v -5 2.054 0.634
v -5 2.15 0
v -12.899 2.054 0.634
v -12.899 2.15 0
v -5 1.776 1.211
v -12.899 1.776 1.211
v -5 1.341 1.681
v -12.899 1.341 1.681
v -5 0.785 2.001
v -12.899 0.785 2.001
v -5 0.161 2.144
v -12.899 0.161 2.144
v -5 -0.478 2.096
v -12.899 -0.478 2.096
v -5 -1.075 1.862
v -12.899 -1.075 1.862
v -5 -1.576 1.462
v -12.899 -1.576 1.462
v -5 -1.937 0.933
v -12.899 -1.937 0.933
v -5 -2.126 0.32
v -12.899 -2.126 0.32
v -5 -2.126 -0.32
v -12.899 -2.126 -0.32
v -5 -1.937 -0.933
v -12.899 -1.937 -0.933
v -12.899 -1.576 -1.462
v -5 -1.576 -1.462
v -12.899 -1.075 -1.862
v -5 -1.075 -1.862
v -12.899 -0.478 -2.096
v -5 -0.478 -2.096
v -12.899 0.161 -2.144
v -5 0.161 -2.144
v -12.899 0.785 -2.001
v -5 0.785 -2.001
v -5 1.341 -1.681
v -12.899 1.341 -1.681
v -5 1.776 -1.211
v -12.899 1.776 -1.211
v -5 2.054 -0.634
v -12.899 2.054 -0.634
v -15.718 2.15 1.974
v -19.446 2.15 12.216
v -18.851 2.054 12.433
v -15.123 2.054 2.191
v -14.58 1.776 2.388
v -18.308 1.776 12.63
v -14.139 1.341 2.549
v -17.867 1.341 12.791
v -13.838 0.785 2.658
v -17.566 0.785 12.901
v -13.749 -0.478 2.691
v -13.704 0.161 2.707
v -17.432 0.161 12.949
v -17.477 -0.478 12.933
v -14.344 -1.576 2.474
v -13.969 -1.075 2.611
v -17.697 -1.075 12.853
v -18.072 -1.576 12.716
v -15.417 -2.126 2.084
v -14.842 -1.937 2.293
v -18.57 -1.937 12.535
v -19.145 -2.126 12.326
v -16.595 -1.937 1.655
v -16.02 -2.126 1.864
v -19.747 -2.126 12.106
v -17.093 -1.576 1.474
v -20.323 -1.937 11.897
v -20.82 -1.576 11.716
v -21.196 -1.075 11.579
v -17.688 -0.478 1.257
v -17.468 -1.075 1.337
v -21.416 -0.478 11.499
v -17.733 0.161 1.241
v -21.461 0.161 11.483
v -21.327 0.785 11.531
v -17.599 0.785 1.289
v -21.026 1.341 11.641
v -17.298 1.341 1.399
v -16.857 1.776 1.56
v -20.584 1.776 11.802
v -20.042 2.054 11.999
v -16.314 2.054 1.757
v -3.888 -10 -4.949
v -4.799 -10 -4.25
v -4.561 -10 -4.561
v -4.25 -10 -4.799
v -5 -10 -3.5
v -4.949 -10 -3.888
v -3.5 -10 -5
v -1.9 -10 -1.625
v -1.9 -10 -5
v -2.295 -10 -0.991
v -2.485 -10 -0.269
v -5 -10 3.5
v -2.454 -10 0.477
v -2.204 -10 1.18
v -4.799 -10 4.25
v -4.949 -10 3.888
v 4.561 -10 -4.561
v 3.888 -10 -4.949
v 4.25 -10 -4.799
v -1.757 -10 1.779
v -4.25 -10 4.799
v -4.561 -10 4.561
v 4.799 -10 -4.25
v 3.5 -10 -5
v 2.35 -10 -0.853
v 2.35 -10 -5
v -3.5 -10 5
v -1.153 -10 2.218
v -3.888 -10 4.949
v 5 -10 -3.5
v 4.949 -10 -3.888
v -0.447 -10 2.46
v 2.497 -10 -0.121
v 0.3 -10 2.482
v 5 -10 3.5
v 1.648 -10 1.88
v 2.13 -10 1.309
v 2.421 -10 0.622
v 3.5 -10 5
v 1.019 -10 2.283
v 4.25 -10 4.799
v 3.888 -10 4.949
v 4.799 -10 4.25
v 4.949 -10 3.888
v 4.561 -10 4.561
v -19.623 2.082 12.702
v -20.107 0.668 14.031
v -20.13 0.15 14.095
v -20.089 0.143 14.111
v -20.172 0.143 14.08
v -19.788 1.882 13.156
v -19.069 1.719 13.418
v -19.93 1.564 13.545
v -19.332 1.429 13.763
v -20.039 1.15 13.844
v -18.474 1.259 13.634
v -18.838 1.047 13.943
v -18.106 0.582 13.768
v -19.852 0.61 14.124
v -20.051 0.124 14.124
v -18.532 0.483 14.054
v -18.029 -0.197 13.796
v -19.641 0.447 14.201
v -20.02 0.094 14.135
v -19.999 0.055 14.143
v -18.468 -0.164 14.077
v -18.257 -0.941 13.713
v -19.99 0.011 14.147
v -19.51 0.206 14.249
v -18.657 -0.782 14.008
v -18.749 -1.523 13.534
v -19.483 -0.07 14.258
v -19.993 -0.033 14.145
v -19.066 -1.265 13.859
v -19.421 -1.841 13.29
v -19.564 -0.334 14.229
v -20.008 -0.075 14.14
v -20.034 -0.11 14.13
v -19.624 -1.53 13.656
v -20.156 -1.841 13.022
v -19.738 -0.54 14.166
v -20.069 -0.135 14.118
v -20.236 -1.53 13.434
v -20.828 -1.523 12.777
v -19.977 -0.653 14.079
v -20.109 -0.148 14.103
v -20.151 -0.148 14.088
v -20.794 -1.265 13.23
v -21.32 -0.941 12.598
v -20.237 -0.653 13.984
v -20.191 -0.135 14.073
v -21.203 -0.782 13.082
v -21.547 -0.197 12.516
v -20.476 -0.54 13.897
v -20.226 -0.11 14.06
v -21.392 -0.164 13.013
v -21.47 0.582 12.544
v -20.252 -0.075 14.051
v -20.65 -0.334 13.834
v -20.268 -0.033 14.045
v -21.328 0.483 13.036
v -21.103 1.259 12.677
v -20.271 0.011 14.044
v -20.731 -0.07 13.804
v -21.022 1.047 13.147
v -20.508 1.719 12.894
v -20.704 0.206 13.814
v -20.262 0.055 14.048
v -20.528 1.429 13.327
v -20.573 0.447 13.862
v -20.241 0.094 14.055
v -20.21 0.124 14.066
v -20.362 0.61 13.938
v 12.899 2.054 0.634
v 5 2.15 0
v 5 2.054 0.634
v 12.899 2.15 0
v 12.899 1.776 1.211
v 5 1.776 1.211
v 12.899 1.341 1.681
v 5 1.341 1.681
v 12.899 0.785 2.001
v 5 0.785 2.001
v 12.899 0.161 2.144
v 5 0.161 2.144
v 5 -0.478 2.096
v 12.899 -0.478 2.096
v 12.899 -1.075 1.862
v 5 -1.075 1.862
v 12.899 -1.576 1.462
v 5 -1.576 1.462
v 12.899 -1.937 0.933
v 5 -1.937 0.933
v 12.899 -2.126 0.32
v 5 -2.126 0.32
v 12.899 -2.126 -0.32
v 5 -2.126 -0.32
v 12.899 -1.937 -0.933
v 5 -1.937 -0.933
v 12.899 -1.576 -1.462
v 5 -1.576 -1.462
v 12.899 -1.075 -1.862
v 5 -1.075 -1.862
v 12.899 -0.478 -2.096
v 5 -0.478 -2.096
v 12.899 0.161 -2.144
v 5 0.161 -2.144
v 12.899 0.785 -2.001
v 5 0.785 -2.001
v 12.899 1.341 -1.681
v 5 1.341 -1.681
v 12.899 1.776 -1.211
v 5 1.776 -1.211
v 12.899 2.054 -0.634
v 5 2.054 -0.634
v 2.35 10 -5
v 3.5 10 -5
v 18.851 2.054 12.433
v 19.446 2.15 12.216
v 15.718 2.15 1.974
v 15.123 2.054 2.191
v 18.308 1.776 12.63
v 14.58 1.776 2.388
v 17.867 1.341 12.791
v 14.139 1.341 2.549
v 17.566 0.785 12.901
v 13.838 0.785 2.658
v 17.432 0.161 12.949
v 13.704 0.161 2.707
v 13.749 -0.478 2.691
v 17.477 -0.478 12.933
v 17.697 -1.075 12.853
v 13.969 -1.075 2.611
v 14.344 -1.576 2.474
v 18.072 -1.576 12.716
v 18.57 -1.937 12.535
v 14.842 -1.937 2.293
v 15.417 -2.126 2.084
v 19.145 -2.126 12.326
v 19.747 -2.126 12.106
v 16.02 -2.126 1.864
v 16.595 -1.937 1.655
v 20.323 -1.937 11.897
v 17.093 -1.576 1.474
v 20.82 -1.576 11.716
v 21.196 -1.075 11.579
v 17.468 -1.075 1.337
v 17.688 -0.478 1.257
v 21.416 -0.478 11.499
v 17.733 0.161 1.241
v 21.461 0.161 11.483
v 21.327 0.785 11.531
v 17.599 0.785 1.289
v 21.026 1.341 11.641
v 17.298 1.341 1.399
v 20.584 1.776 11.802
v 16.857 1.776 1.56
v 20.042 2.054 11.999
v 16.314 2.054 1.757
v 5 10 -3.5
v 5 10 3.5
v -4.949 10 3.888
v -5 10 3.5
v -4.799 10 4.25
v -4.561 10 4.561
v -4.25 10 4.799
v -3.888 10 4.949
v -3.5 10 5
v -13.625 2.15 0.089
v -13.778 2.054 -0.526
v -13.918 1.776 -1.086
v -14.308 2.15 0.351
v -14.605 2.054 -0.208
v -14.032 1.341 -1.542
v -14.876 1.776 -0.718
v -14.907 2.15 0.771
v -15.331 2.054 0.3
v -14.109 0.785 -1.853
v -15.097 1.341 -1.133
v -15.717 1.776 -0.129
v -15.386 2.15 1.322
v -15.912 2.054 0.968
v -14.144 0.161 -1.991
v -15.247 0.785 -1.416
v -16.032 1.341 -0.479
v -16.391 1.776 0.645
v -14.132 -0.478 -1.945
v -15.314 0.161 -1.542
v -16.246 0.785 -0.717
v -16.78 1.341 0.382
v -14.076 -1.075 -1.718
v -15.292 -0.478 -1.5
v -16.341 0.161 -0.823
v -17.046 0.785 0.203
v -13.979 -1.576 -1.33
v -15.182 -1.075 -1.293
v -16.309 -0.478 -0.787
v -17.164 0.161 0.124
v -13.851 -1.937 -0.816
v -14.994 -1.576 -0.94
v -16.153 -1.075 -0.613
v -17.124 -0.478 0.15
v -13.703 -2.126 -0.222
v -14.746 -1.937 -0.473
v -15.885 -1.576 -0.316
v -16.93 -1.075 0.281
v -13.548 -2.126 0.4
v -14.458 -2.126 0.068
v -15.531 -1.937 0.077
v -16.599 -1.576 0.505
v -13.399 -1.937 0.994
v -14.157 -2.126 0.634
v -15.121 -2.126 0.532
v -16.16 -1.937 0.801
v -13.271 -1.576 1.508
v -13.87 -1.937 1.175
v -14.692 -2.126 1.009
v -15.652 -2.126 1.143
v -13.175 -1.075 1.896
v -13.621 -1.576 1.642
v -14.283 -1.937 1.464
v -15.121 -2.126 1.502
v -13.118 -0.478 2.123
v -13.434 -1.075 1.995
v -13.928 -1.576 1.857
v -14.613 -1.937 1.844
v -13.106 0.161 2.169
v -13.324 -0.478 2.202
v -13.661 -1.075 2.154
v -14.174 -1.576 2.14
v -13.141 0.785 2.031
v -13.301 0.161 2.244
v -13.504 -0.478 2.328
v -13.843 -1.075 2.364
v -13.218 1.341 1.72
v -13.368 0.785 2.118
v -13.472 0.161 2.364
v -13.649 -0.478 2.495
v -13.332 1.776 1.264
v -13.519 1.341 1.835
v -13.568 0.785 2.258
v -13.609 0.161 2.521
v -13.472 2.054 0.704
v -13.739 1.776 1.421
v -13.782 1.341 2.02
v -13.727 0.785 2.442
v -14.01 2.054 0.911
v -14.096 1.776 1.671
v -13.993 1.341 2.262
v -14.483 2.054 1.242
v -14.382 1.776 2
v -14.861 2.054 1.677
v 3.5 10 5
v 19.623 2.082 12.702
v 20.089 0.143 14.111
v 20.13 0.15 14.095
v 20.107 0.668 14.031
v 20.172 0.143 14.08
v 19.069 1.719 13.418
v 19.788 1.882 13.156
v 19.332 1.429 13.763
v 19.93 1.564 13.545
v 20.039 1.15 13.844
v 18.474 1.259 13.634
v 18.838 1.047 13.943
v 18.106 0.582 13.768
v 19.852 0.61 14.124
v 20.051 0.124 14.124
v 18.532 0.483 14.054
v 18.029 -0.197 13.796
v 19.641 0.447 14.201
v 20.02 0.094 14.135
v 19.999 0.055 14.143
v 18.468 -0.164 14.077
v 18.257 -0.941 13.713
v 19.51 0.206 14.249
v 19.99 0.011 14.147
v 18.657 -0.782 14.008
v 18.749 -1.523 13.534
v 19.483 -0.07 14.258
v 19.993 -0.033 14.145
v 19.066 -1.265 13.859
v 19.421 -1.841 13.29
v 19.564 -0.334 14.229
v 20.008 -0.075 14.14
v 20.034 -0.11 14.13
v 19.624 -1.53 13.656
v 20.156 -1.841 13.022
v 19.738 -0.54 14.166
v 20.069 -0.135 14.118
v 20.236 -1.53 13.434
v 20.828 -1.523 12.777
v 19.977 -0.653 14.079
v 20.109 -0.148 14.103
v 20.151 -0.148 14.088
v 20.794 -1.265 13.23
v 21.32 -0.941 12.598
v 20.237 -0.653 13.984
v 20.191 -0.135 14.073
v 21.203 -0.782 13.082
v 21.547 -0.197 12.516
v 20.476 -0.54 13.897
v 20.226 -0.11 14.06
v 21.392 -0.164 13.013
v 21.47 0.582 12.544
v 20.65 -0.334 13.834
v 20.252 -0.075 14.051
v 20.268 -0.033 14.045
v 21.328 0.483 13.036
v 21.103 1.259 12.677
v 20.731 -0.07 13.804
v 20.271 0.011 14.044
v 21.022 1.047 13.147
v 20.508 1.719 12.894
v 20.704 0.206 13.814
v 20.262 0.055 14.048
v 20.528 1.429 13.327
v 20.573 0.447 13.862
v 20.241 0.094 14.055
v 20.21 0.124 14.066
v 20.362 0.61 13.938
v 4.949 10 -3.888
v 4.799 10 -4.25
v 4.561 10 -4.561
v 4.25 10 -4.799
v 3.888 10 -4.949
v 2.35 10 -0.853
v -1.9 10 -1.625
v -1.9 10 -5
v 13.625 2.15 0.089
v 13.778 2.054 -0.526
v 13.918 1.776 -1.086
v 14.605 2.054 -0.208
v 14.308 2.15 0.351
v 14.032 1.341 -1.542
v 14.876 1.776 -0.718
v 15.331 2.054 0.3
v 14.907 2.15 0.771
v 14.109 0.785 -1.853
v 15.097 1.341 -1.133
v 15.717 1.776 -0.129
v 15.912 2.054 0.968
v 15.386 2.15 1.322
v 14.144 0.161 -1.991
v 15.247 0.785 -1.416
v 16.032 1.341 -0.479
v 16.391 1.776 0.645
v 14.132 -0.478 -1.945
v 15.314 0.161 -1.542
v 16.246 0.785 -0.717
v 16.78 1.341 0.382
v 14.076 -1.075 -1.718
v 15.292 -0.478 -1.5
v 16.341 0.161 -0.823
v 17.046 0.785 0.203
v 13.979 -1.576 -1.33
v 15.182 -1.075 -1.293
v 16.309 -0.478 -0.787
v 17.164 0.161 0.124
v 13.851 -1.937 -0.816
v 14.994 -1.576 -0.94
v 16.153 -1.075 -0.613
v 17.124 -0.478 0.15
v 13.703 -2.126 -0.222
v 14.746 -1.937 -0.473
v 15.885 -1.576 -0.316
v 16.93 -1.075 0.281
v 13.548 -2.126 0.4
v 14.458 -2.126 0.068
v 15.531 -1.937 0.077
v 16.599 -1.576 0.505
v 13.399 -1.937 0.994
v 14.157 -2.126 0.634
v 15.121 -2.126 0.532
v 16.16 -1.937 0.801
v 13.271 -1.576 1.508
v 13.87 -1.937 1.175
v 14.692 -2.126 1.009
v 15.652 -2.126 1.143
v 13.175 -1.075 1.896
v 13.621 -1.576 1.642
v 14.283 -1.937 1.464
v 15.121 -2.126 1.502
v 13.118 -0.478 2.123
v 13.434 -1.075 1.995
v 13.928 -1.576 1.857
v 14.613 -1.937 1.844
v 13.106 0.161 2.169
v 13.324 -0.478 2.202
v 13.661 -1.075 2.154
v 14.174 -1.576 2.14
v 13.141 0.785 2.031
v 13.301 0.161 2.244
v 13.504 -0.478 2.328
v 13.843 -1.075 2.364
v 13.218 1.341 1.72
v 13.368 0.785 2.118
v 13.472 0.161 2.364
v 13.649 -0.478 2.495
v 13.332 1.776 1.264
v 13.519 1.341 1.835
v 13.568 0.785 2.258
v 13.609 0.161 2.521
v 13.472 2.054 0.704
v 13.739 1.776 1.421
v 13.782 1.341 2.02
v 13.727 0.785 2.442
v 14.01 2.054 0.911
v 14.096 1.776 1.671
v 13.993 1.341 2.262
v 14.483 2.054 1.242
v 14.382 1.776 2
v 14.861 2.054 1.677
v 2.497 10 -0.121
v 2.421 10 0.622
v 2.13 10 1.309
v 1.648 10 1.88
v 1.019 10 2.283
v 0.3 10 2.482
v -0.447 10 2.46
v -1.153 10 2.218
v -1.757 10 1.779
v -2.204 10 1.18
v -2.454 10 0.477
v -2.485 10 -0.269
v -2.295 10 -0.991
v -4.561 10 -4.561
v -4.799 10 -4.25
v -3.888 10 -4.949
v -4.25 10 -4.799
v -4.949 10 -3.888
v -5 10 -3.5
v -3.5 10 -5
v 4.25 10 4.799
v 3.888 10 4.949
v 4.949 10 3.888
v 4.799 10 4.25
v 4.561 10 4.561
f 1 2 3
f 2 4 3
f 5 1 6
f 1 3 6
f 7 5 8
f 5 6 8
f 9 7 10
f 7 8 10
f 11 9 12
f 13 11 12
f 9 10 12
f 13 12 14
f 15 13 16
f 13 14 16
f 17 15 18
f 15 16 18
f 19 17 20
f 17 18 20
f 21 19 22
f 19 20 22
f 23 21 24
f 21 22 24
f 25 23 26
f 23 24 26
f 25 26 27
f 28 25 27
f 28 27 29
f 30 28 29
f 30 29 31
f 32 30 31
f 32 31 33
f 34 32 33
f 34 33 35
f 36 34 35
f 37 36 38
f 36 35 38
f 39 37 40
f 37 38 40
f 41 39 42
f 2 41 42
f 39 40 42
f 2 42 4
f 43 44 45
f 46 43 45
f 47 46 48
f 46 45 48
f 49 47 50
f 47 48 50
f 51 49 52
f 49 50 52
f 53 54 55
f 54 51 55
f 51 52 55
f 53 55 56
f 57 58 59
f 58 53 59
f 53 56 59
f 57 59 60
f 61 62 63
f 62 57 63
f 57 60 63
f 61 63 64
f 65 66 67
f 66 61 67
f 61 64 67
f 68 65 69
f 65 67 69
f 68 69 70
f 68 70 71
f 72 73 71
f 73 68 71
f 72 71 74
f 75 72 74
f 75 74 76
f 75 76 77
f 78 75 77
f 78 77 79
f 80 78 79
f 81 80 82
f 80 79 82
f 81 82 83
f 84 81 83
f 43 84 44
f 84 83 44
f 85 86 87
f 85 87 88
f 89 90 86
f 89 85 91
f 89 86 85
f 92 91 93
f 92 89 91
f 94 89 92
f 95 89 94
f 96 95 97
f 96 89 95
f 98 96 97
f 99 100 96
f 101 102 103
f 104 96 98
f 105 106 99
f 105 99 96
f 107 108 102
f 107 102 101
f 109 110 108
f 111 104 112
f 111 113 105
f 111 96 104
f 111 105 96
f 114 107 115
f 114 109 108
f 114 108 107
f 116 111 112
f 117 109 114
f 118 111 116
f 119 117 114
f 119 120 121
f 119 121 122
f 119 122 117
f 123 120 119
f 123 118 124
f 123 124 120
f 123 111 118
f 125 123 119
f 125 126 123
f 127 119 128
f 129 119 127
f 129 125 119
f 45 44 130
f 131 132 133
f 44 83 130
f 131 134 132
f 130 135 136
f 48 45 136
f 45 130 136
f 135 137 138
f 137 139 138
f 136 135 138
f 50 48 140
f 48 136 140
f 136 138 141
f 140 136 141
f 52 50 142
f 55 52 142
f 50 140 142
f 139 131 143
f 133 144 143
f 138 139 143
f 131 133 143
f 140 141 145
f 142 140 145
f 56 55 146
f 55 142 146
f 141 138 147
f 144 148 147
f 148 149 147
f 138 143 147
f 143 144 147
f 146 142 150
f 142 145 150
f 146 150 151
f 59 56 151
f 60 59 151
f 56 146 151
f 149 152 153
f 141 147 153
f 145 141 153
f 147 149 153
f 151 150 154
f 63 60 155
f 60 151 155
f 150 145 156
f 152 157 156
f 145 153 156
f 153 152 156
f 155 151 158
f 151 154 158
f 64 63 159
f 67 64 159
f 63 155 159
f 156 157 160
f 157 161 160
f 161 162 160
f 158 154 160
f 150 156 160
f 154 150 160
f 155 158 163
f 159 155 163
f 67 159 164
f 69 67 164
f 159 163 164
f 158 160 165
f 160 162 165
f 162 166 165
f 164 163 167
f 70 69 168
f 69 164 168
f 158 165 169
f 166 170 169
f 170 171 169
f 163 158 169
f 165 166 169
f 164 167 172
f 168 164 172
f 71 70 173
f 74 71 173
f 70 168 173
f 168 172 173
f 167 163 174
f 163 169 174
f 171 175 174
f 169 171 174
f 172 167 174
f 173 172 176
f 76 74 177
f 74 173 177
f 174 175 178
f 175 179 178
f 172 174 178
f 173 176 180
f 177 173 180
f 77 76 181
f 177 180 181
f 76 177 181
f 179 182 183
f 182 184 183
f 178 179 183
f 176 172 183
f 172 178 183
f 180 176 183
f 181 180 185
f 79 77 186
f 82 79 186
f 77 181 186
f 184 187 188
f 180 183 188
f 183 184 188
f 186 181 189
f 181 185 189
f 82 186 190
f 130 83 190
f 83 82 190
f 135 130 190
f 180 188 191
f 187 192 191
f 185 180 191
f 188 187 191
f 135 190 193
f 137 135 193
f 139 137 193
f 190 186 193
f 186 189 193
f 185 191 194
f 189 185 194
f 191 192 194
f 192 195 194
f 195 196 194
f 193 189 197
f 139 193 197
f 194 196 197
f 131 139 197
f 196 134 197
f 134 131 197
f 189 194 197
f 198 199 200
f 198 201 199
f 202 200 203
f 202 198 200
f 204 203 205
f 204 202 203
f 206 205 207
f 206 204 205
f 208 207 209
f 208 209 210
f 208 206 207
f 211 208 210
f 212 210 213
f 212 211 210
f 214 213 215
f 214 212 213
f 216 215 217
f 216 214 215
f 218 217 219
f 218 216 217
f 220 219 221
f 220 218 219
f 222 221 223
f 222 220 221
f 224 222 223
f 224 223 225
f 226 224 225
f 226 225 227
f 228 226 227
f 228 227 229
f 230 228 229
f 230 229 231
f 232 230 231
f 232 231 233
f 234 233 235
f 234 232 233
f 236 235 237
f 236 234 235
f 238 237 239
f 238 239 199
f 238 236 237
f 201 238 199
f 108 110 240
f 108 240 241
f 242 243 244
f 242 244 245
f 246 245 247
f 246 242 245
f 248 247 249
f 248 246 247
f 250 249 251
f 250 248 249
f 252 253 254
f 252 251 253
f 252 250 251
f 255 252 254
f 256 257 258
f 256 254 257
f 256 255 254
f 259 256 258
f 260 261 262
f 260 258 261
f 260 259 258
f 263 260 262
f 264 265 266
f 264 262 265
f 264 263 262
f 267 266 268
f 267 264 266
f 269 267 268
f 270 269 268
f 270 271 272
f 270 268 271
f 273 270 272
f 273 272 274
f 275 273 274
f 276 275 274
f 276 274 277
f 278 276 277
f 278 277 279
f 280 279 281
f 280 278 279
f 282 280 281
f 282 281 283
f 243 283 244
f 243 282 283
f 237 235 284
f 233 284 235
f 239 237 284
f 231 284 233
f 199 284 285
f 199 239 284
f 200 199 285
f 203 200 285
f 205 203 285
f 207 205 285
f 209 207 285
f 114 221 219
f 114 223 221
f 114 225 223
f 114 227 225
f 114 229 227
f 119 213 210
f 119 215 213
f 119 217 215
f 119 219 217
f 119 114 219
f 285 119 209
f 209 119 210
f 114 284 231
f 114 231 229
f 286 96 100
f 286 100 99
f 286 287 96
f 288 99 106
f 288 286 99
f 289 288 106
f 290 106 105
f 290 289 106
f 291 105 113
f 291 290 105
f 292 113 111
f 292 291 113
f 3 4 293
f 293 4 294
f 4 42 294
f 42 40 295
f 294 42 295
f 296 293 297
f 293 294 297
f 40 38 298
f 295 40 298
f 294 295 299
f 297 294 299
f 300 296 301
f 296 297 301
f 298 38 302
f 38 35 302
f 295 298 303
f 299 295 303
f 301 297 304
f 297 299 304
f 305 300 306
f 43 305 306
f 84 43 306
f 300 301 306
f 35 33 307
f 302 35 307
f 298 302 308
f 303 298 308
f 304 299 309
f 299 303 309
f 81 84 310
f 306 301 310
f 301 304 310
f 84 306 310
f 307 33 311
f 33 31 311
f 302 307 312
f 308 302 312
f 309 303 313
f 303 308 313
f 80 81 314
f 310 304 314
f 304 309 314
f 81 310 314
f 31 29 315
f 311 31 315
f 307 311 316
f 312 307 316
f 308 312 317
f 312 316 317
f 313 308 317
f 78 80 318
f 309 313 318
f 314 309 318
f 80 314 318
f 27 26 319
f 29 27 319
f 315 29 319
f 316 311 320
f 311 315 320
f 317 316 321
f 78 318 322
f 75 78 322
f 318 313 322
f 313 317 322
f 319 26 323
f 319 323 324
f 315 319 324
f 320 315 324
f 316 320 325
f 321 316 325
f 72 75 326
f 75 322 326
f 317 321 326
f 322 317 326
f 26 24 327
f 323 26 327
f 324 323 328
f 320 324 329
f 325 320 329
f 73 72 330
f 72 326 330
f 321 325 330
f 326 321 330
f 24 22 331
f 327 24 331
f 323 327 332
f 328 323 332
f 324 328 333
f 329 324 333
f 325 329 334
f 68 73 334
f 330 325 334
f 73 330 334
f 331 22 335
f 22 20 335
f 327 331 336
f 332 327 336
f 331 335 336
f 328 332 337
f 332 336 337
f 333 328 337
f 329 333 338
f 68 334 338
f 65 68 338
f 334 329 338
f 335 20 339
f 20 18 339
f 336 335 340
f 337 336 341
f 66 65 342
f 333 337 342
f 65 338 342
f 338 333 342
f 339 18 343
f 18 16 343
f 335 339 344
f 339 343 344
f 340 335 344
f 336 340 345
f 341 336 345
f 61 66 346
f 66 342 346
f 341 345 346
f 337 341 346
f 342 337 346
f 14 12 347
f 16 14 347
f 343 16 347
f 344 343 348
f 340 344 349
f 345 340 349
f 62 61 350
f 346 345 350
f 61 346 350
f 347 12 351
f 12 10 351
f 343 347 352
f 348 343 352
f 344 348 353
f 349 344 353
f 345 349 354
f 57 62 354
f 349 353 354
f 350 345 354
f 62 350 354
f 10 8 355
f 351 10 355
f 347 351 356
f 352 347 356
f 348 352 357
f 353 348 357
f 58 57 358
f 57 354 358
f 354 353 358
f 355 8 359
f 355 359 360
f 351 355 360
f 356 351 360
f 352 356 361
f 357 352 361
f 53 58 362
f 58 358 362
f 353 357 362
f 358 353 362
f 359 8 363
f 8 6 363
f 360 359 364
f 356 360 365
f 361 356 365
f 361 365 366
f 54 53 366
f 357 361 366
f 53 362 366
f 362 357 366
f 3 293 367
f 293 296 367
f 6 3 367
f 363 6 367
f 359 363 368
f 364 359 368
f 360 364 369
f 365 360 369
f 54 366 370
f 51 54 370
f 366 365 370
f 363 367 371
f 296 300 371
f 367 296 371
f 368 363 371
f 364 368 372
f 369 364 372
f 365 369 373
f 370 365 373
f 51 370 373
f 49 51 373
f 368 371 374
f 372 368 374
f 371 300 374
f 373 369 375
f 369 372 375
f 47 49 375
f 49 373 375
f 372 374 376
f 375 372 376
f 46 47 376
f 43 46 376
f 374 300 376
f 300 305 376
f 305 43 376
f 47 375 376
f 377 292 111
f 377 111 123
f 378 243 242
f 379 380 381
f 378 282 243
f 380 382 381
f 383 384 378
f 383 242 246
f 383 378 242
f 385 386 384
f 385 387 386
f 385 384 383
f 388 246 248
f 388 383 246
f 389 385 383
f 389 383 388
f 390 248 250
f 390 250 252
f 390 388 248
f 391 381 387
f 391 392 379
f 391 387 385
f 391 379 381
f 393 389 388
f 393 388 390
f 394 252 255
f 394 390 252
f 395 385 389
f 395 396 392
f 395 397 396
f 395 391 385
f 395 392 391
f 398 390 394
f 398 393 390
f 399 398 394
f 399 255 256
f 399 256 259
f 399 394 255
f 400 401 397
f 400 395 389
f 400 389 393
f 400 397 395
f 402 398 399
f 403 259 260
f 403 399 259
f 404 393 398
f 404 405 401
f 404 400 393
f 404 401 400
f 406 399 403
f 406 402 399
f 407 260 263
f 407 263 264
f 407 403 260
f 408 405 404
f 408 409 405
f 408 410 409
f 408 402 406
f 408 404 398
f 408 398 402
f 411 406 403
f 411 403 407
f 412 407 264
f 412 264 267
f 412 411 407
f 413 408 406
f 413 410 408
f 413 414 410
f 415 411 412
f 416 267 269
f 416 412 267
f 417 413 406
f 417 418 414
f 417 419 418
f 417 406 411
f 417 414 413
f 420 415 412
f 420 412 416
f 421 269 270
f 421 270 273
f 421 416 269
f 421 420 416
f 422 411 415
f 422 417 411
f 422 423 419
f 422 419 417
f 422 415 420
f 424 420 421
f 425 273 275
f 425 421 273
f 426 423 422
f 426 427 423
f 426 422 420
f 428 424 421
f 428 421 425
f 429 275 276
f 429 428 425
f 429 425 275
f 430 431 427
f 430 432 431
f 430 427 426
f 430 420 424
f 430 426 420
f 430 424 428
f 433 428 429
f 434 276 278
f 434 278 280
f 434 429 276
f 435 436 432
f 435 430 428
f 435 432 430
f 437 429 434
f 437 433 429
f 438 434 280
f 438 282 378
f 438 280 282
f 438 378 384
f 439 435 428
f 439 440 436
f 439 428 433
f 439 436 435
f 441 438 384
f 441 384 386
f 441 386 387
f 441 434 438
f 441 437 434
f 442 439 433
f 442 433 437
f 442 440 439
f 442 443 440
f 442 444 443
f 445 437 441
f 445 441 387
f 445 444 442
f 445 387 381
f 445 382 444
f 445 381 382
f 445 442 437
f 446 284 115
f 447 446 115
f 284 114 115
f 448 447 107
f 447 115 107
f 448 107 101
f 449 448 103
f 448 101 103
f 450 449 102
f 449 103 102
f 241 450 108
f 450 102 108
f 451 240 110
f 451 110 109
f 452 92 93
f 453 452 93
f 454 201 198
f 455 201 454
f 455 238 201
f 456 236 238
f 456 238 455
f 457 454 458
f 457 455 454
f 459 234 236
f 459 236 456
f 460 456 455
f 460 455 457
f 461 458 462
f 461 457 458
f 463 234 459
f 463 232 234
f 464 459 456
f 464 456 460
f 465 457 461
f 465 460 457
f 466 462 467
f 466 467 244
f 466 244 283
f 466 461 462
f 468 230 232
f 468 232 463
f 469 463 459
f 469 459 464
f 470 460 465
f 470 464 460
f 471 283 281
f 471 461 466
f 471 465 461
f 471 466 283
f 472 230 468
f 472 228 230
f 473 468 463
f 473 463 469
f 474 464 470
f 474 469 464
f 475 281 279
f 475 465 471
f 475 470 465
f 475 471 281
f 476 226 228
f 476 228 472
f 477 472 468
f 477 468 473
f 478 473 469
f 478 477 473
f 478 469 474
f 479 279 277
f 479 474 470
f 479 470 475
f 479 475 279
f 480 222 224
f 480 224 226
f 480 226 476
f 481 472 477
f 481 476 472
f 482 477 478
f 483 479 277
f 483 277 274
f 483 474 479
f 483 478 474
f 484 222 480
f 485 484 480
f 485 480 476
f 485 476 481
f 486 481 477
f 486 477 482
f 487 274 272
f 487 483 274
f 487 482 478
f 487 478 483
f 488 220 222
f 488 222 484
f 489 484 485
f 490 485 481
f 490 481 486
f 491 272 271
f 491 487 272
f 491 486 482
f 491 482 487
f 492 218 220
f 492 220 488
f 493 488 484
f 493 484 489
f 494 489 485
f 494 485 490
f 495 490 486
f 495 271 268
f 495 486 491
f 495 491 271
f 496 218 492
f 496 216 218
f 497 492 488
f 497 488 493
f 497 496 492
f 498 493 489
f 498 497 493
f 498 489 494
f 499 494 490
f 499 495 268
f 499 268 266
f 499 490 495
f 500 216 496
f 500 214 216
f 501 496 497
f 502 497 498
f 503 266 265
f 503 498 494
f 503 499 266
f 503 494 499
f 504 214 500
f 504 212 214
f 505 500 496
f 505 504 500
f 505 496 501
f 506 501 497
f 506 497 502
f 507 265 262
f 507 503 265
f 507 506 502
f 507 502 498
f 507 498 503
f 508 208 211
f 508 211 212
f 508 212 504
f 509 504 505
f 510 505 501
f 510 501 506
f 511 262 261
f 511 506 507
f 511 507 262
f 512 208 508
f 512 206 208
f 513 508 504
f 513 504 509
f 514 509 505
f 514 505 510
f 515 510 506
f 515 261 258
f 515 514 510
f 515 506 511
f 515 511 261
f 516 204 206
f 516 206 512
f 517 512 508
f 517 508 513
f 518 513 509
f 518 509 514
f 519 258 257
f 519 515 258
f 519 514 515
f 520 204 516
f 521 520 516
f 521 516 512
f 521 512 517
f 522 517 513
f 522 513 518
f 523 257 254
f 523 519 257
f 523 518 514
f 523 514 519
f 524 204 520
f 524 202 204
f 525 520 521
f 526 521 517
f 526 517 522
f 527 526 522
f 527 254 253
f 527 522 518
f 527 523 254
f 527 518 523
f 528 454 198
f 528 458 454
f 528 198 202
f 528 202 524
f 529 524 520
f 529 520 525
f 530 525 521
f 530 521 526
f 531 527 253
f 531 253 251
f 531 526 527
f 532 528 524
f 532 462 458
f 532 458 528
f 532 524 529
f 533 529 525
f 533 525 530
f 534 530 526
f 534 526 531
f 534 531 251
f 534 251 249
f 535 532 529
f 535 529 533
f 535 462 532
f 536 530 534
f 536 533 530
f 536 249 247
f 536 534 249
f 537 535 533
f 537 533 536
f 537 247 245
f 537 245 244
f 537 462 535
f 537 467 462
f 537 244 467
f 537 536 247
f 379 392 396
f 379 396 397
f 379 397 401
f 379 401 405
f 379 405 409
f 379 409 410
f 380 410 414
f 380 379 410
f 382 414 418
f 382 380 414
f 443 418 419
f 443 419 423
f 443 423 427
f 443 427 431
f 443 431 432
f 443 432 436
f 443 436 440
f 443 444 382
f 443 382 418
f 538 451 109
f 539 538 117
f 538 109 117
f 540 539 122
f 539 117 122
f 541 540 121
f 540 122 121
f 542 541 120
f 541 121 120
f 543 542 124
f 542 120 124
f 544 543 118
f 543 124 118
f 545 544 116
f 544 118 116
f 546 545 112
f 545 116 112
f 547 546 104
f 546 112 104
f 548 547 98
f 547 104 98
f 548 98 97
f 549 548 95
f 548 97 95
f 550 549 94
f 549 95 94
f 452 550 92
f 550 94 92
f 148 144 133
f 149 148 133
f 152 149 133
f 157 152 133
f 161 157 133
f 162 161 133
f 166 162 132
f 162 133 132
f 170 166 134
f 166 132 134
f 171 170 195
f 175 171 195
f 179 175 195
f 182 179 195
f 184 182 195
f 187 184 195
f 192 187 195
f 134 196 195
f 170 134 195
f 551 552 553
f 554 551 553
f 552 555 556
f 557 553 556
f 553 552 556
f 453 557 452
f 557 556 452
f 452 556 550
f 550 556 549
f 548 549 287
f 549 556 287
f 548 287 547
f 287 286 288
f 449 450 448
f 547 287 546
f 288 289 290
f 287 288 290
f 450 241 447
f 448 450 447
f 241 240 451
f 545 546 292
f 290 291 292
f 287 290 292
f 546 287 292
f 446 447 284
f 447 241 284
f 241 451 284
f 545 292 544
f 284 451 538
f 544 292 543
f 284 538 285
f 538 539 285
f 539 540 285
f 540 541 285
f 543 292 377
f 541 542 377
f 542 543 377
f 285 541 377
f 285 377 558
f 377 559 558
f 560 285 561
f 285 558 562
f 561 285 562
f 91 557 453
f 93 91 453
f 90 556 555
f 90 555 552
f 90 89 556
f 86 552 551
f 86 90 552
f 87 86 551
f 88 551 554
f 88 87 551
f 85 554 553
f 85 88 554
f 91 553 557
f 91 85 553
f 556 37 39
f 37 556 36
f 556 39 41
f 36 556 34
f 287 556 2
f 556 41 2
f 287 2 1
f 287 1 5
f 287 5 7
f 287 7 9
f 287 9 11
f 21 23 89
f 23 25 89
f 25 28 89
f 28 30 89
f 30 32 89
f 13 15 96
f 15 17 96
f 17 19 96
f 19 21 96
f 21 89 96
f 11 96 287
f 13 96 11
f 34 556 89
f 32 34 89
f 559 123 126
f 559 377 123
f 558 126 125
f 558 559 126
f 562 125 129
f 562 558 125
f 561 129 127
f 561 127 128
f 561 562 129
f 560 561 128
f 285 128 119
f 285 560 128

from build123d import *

# Parameters (mm, degrees)
F0_W     = 10
F0_H     = 10
F1_DEPTH = 10
F4_R     = 2.15
F3_R     = 2.5
F7_DEPTH = 25
F8_W     = 4.25
F8_H     = 1.8911467679
F9_DEPTH = 63
F10_R    = 1.5
F11_R    = 2


# Not quite as in the source:
# - an extrude ends at something that could not be found from the text; its depth is read off the source's solid


with BuildPart() as f1:
    # F0 (on Front) → F1 (new body, symmetric)
    with BuildSketch(Plane.XZ):
        Rectangle(F0_W, F0_H)
    extrude(amount=F1_DEPTH, both=True)

    # F5: sweep along a path in F2
    with BuildLine(Plane.XZ) as f5_path:
        Line((0, 0), (12.8993773854, 0))
        ThreePointArc((12.8993773854, 0), (14.6201066944, 0.5425438671), (15.7184552477, 1.97393957))
        Line((15.7184552477, 1.97393957), (20.1303021499, 14.0953893118))
    # F4 (on face) → F5 (sweep)
    with BuildSketch(Plane.YZ.offset(5)):
        Circle(F4_R)
    sweep(path=f5_path.line)

    # F6: F1 across plane


with BuildPart() as f1_1:
    add(f1.part)
    add(f1.part.mirror(Plane.YZ))

    # F3 (on face) → F7 (cut)
    with BuildSketch(Plane.XZ.offset(10)):
        Circle(F3_R)
    extrude(amount=-F7_DEPTH, mode=Mode.SUBTRACT)

    # F8 (on face) → F9 (cut, through all)
    with BuildSketch(Plane.XZ.offset(10)):
        with Locations((0.225, -5.9455733839)):
            Rectangle(F8_W, F8_H)
        with BuildLine():
            Line((-1.9, -1.6248076809), (-1.9, -5))
            Line((-1.9, -5), (2.35, -5))
            Line((2.35, -5), (2.35, -0.8529361055))
            ThreePointArc((2.35, -0.8529361055), (0.4467341852, -2.4597618925), (-1.9, -1.6248076809))
        make_face()
        with BuildLine():
            Line((-1.9, 0), (-1.9, -1.6248076809))
            ThreePointArc((-1.9, -1.6248076809), (0.4467341852, -2.4597618925), (2.35, -0.8529361055))
            Line((2.35, -0.8529361055), (2.35, 0))
            Line((2.35, 0), (-1.9, 0))
        make_face()
    extrude(amount=-F9_DEPTH, mode=Mode.SUBTRACT)

    # F10
    f10_edges = [f1_1.edges().sort_by_distance(p)[0] for p in [
        (5, 0, 5),
        (-5, 0, 5),
        (5, 0, -5),
        (-5, 0, -5),
    ]]
    fillet(f10_edges, radius=F10_R)

    # F11
    f11_edges = [f1_1.edges().sort_by_distance(p)[0] for p in [
        (-20.130302, -2.15, 14.095389),
        (20.130302, -2.15, 14.095389),
    ]]
    fillet(f11_edges, radius=F11_R)


solid = f1_1.part
